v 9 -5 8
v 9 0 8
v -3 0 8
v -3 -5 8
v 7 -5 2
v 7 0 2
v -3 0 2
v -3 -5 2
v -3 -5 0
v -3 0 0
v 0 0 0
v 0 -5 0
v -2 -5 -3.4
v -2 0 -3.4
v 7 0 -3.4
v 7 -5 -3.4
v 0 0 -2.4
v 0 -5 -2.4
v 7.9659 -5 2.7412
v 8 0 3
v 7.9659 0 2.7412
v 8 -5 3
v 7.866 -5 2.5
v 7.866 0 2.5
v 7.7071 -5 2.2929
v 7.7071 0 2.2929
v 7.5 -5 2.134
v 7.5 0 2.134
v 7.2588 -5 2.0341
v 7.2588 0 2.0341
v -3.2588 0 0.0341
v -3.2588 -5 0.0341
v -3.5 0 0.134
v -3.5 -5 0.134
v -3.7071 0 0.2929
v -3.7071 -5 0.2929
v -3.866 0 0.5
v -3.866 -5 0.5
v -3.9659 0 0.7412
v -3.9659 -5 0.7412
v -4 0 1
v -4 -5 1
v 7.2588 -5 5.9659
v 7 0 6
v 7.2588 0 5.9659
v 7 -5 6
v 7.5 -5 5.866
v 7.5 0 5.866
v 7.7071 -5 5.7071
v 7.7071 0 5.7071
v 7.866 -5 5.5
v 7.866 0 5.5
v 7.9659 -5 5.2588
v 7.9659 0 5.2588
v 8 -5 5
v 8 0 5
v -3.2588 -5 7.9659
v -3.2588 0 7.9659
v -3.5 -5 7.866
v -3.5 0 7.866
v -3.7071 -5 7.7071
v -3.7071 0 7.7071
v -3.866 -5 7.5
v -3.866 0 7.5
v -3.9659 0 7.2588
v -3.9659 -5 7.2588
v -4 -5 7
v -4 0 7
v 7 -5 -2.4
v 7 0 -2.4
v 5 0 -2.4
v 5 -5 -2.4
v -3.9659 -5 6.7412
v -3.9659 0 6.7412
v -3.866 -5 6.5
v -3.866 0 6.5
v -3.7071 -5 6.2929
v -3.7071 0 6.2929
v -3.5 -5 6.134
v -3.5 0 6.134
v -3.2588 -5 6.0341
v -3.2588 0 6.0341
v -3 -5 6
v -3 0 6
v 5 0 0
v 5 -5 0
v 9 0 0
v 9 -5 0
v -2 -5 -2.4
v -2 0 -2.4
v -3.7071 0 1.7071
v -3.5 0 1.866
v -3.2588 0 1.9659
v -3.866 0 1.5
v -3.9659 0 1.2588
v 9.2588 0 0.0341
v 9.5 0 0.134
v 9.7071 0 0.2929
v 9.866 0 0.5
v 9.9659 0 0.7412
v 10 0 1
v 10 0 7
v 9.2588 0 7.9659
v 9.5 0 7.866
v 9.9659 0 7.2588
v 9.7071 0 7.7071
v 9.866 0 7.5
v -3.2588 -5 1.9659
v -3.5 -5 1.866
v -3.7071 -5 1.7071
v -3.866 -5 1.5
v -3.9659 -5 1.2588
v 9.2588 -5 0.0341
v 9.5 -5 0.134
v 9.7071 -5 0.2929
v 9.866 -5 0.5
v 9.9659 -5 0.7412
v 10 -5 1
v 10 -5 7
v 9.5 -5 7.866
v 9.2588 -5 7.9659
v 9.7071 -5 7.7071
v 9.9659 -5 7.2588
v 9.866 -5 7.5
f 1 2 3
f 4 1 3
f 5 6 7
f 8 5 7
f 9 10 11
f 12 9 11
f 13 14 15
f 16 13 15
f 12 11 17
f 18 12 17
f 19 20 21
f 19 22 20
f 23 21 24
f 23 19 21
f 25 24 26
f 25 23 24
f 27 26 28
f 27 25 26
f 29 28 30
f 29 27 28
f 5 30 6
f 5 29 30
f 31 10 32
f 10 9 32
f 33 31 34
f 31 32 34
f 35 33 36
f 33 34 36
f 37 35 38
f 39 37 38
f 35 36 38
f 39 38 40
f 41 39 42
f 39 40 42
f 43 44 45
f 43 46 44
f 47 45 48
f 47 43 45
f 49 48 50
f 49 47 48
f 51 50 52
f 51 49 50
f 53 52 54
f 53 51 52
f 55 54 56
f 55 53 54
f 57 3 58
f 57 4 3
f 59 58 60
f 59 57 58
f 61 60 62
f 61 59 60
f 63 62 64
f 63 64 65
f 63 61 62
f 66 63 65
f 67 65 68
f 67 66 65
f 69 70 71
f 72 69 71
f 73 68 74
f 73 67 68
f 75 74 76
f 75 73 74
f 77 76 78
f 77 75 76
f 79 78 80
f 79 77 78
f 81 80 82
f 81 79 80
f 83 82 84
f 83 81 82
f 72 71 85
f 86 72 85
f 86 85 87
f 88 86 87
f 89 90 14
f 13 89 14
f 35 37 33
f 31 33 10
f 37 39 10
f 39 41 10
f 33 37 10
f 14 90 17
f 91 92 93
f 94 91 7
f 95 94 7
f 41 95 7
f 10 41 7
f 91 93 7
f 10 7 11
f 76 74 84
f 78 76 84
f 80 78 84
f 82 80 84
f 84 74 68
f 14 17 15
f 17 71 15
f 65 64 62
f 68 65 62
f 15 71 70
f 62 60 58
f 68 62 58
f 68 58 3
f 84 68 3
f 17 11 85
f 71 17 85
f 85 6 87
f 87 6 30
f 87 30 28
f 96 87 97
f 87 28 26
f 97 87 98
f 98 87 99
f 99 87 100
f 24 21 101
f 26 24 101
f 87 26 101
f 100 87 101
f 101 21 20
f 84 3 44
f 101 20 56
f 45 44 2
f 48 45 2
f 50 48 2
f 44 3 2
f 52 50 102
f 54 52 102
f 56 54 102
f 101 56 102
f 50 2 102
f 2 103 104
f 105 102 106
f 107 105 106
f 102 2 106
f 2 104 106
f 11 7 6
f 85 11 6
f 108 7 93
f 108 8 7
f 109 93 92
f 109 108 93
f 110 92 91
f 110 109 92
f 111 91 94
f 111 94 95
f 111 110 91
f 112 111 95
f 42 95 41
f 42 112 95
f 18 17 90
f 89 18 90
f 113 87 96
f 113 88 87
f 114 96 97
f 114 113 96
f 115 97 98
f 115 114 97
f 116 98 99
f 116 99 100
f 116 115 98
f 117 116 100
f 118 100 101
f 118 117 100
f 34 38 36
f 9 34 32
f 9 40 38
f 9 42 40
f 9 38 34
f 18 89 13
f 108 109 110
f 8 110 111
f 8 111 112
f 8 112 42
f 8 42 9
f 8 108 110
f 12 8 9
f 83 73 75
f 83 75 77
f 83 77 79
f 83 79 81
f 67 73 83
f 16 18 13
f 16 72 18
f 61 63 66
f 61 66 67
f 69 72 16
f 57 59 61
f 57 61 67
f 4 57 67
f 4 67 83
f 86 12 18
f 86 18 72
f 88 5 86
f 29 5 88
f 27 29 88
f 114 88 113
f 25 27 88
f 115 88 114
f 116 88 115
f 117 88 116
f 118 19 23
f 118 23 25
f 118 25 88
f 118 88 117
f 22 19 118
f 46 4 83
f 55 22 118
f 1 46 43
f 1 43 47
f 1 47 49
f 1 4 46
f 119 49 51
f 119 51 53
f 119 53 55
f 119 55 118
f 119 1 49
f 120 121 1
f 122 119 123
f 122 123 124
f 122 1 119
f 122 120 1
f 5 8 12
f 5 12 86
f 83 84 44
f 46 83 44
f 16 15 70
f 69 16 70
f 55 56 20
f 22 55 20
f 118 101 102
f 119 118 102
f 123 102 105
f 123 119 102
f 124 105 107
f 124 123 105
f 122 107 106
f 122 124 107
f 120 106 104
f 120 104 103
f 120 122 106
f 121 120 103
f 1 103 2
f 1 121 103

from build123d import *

# Parameters (mm, degrees)
F1_DEPTH = 5
F2_R     = 0.99999


# Not quite as in the source:
# - a fillet or chamfer is up to 0.001 mm smaller than in the source, because OpenCascade refuses the exact size
# - a feature names something its author has since deleted; it is built from what else it names


with BuildPart() as f1:
    # F0 (on Front) → F1 (new body)
    with BuildSketch(Plane.XZ):
        Polygon((-4, 0), (0, 0), (0, -2.4), (-2, -2.4), (-2, -3.4), (7, -3.4), (7, -2.4), (5, -2.4), (5, 0), (10, 0), (10, 8), (-4, 8), (-4, 6), (8, 6), (8, 2), (-4, 2), align=None)
    extrude(amount=F1_DEPTH)

    # F2 (radius 1 in the source; OpenCascade refuses exactly that, so slightly less here)
    f2_edges = [f1.edges().sort_by_distance(p)[0] for p in [
        (8, -2.5, 6),
        (8, -2.5, 2),
        (10, -2.5, 0),
        (10, -2.5, 8),
        (-4, -2.5, 8),
        (-4, -2.5, 6),
        (-4, -2.5, 0),
        (-4, -2.5, 2),
    ]]
    fillet(f2_edges, radius=F2_R)


solid = f1.part
